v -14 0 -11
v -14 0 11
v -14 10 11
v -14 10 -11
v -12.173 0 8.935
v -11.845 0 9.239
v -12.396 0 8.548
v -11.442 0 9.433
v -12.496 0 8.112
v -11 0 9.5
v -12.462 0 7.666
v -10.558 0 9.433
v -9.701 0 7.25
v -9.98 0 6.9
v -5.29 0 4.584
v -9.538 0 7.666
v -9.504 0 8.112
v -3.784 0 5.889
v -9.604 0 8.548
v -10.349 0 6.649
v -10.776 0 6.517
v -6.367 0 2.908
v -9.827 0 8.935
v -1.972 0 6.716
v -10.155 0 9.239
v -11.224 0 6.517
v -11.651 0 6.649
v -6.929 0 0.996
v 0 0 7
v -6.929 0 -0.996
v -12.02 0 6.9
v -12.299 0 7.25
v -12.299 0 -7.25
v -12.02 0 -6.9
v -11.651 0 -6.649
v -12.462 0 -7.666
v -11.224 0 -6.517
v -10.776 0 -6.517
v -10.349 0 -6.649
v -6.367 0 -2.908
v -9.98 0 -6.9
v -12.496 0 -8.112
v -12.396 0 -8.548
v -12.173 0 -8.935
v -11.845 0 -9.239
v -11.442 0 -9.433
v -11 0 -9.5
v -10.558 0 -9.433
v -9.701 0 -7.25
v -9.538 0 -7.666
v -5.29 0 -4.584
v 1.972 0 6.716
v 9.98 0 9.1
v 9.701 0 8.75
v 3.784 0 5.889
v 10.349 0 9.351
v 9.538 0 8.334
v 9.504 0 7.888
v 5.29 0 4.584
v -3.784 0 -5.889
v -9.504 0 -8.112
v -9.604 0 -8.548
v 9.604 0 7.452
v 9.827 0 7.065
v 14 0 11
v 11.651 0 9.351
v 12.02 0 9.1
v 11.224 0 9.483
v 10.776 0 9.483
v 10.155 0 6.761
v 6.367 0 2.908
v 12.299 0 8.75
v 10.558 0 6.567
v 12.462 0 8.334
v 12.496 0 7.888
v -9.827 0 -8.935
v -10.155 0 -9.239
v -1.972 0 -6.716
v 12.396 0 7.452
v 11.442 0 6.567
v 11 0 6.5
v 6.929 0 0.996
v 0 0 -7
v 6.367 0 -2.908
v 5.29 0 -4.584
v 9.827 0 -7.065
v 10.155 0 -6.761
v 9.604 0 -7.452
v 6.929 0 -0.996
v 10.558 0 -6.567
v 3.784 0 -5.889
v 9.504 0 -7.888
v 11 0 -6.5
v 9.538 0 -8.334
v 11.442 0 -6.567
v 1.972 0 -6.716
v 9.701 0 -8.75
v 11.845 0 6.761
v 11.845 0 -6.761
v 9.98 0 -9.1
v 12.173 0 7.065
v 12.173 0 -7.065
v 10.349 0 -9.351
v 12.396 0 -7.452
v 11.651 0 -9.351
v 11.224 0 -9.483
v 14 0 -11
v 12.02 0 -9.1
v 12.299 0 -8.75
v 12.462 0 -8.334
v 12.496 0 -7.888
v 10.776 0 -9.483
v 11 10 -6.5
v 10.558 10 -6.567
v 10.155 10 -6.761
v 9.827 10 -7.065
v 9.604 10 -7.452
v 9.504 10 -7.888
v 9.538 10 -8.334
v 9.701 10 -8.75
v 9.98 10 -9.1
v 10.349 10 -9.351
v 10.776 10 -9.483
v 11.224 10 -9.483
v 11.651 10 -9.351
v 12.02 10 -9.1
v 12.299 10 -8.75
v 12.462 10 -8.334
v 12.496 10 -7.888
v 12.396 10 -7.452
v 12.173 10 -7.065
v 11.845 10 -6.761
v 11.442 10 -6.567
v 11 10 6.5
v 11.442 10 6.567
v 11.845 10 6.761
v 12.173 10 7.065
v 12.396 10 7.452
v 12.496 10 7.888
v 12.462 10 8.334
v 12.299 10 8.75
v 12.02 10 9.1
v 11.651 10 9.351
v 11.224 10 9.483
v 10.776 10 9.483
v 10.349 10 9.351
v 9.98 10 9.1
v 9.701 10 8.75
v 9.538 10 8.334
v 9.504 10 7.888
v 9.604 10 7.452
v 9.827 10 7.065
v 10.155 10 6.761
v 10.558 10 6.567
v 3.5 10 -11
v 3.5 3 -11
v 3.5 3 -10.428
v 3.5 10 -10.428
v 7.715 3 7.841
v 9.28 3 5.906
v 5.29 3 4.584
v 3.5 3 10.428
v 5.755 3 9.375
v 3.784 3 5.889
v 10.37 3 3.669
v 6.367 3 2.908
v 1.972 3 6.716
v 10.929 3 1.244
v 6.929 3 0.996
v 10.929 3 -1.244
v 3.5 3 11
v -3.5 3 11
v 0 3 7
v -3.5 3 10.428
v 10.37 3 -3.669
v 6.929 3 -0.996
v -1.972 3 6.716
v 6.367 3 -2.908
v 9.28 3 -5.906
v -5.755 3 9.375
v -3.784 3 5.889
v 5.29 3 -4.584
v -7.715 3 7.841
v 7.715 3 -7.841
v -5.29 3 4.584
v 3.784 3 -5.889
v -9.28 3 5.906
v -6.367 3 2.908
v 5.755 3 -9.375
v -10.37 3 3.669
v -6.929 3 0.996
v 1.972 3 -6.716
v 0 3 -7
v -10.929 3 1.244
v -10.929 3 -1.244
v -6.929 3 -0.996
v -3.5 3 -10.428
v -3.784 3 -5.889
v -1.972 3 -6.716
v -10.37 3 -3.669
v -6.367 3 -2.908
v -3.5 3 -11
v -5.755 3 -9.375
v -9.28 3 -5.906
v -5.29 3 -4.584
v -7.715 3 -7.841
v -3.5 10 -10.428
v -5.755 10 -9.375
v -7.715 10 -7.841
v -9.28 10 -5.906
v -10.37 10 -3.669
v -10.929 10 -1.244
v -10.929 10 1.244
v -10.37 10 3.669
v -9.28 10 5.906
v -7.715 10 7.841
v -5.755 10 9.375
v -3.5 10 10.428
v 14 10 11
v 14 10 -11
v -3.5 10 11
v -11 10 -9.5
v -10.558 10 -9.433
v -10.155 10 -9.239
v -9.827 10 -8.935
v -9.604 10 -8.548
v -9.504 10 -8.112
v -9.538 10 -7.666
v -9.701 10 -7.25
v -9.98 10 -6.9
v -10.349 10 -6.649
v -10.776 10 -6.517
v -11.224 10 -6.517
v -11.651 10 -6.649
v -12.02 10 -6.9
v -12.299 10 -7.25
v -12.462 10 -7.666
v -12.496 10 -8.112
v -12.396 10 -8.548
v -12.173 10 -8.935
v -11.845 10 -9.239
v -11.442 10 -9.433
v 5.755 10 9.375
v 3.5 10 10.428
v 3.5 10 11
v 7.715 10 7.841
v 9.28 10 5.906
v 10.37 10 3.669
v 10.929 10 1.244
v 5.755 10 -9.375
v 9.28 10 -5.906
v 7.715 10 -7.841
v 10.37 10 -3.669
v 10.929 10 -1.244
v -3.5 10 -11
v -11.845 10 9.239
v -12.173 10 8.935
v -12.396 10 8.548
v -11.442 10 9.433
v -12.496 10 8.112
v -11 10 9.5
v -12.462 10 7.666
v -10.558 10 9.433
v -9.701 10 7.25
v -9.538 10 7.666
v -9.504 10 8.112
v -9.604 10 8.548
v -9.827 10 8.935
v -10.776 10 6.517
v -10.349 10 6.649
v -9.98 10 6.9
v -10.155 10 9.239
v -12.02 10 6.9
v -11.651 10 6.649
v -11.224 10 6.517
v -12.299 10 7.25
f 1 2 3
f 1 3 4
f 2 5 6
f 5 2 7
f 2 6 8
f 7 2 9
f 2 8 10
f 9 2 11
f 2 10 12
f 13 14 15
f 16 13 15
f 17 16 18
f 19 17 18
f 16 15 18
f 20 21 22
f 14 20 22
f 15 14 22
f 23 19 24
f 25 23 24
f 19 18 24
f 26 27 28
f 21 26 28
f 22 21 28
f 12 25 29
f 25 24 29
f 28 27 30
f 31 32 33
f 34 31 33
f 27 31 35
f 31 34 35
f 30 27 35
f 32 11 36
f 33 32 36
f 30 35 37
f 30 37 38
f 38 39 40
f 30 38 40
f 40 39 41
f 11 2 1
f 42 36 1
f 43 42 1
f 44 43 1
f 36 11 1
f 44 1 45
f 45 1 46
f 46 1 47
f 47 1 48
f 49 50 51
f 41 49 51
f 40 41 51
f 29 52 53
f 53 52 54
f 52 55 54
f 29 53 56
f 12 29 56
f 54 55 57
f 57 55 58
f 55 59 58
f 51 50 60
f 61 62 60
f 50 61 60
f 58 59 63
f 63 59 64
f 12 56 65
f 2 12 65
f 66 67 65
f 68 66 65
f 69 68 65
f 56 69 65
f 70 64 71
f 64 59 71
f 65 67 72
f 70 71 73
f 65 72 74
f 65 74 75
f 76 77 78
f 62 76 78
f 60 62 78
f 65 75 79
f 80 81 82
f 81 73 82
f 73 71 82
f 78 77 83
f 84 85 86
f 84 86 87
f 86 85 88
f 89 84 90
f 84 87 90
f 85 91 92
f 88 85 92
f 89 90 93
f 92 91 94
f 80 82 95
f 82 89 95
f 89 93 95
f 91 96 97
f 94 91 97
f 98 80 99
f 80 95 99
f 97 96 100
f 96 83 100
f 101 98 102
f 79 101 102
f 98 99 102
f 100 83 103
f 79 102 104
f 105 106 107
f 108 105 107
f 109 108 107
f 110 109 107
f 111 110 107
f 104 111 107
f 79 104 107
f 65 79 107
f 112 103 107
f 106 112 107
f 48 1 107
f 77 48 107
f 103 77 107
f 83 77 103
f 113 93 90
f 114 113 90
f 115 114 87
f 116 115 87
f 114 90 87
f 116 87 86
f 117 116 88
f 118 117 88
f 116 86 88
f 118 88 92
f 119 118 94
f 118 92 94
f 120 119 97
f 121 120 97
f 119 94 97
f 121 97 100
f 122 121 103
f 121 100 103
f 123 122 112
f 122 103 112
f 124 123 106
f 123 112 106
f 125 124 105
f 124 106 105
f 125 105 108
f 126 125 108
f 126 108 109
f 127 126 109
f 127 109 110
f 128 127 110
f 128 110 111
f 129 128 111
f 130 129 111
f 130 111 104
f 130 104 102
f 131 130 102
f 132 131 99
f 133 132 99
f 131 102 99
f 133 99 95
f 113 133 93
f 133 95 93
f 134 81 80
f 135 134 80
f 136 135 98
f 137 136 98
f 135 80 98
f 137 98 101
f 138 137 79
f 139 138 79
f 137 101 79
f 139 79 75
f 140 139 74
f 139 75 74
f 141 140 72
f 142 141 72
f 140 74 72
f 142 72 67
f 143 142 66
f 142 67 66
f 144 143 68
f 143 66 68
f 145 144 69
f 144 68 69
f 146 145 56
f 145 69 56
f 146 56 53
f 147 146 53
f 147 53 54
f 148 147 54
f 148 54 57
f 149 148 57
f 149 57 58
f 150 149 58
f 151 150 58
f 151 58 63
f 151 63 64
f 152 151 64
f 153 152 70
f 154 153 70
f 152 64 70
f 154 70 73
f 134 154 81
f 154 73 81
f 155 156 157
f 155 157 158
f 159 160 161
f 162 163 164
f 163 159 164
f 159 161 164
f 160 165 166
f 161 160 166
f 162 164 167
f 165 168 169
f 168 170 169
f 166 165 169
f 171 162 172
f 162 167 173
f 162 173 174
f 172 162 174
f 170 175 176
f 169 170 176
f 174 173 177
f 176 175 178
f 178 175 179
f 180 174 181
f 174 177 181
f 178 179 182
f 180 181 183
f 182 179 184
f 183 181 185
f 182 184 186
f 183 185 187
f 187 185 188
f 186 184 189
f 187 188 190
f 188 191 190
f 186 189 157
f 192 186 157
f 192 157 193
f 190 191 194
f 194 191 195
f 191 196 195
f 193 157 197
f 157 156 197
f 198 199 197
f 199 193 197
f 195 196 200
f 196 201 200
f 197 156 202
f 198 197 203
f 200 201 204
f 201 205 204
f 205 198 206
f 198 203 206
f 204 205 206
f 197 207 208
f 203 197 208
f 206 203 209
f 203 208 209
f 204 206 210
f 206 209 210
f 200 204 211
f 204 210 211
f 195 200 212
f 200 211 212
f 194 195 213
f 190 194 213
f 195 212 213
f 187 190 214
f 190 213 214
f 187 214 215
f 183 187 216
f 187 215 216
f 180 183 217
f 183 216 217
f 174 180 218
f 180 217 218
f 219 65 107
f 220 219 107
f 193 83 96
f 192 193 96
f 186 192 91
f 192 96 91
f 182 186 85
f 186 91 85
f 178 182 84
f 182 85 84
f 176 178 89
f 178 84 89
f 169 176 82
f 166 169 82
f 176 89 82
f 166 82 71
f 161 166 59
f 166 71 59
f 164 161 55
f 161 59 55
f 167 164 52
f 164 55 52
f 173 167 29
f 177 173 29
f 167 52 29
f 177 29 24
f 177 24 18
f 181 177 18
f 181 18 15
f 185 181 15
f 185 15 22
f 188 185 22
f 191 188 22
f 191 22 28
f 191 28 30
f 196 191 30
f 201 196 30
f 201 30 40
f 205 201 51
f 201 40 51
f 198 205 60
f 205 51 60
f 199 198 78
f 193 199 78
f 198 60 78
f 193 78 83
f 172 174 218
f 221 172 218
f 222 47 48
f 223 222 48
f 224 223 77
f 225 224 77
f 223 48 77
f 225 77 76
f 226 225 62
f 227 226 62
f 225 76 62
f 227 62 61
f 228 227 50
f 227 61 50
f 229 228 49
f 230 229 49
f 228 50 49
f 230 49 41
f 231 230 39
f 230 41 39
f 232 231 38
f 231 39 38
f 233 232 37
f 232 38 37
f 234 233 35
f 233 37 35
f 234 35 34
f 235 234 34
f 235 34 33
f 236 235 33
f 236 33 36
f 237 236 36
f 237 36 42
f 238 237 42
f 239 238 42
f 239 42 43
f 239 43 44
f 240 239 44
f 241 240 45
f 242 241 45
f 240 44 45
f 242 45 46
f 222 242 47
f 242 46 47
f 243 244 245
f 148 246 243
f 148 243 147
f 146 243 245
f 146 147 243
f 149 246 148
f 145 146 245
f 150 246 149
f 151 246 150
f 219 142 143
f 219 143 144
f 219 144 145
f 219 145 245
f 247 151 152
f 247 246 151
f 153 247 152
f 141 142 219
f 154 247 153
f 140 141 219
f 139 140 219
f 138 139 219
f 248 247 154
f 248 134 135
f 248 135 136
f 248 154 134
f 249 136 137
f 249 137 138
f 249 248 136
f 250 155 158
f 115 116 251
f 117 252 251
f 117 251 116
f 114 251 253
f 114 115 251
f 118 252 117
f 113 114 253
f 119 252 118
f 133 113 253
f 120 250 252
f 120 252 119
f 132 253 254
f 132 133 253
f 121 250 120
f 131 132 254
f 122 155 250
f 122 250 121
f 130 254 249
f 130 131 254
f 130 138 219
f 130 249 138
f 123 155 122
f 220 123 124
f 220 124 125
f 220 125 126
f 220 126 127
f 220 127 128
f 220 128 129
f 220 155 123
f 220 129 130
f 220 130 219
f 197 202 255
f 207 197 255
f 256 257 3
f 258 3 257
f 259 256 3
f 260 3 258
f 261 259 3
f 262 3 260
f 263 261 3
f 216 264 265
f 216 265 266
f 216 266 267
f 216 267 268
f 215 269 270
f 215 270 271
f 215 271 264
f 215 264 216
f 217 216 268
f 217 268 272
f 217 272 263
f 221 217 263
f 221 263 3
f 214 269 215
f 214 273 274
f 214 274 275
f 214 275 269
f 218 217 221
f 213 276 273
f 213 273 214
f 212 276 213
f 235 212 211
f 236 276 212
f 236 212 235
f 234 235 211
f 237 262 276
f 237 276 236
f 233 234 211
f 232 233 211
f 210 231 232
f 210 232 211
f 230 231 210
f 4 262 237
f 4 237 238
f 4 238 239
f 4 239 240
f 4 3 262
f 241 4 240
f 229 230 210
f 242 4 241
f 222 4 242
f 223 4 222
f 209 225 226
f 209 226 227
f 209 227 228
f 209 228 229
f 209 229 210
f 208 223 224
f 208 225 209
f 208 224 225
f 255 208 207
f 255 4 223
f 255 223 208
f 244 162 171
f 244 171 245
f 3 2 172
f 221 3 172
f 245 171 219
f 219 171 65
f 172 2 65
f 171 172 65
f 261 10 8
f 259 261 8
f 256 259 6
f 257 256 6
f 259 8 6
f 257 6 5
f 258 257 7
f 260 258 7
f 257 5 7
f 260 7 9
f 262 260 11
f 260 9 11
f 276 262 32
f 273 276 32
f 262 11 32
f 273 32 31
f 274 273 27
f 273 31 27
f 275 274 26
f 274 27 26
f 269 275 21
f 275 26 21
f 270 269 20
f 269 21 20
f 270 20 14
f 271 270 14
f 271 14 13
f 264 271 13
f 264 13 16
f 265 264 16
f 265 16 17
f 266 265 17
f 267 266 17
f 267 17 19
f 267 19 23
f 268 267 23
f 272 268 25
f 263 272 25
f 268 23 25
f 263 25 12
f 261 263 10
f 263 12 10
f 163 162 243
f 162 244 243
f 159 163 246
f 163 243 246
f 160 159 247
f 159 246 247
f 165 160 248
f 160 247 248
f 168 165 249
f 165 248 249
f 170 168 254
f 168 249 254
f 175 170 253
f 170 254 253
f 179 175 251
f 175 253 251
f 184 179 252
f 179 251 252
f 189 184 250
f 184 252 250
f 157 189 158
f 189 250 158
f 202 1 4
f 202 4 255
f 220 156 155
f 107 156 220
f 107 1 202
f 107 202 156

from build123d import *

# Parameters (mm, degrees)
SKETCH1_W           = 28
SKETCH1_H           = 22
BOSS_EXTRUDE1_DEPTH = 10
SKETCH5_W           = 7
SKETCH5_H           = 7
CUT_EXTRUDE7_DEPTH  = 22
SKETCH2_R           = 11
CUT_EXTRUDE8_DEPTH  = 7
SKETCH6_R           = 7
CUT_EXTRUDE9_DEPTH  = 3
SKETCH7_R           = 1.5
CUT_EXTRUDE10_DEPTH = 10


with BuildPart() as part:
    # Sketch1 → Boss-Extrude1 (new body)
    with BuildSketch(Plane(origin=(0, 0, 0), x_dir=(1, 0, 0), z_dir=(0, 1, 0))):
        Rectangle(SKETCH1_W, SKETCH1_H)
    extrude(amount=BOSS_EXTRUDE1_DEPTH)

    # Sketch5 → Cut-Extrude7 (cut)
    with BuildSketch(Plane(origin=(0, 0, -11), x_dir=(-1, 0, 0), z_dir=(0, 0, -1))):
        with Locations((0, 6.5)):
            Rectangle(SKETCH5_W, SKETCH5_H)
    extrude(amount=-CUT_EXTRUDE7_DEPTH, mode=Mode.SUBTRACT)

    # Sketch2 → Cut-Extrude8 (cut)
    with BuildSketch(Plane(origin=(0, 10, 0), x_dir=(1, 0, 0), z_dir=(0, 1, 0))):
        Circle(SKETCH2_R)
    extrude(amount=-CUT_EXTRUDE8_DEPTH, mode=Mode.SUBTRACT)

    # Sketch6 → Cut-Extrude9 (cut)
    with BuildSketch(Plane.XZ):
        with Locations(Location((0, 0, 0), (0, 0, 270))):
            Circle(SKETCH6_R)
    extrude(amount=-CUT_EXTRUDE9_DEPTH, mode=Mode.SUBTRACT)

    # Sketch7 → Cut-Extrude10 (cut)
    with BuildSketch(Plane.XZ):
        with Locations(Location((11, 8, 0), (0, 0, 270))):
            Circle(SKETCH7_R)
        with Locations(Location((11, -8, 0), (0, 0, 90))):
            Circle(SKETCH7_R)
        with Locations(Location((-11, -8, 0), (0, 0, 270))):
            Circle(SKETCH7_R)
        with Locations(Location((-11, 8, 0), (0, 0, 90))):
            Circle(SKETCH7_R)
    extrude(amount=-CUT_EXTRUDE10_DEPTH, mode=Mode.SUBTRACT)


solid = part.part
